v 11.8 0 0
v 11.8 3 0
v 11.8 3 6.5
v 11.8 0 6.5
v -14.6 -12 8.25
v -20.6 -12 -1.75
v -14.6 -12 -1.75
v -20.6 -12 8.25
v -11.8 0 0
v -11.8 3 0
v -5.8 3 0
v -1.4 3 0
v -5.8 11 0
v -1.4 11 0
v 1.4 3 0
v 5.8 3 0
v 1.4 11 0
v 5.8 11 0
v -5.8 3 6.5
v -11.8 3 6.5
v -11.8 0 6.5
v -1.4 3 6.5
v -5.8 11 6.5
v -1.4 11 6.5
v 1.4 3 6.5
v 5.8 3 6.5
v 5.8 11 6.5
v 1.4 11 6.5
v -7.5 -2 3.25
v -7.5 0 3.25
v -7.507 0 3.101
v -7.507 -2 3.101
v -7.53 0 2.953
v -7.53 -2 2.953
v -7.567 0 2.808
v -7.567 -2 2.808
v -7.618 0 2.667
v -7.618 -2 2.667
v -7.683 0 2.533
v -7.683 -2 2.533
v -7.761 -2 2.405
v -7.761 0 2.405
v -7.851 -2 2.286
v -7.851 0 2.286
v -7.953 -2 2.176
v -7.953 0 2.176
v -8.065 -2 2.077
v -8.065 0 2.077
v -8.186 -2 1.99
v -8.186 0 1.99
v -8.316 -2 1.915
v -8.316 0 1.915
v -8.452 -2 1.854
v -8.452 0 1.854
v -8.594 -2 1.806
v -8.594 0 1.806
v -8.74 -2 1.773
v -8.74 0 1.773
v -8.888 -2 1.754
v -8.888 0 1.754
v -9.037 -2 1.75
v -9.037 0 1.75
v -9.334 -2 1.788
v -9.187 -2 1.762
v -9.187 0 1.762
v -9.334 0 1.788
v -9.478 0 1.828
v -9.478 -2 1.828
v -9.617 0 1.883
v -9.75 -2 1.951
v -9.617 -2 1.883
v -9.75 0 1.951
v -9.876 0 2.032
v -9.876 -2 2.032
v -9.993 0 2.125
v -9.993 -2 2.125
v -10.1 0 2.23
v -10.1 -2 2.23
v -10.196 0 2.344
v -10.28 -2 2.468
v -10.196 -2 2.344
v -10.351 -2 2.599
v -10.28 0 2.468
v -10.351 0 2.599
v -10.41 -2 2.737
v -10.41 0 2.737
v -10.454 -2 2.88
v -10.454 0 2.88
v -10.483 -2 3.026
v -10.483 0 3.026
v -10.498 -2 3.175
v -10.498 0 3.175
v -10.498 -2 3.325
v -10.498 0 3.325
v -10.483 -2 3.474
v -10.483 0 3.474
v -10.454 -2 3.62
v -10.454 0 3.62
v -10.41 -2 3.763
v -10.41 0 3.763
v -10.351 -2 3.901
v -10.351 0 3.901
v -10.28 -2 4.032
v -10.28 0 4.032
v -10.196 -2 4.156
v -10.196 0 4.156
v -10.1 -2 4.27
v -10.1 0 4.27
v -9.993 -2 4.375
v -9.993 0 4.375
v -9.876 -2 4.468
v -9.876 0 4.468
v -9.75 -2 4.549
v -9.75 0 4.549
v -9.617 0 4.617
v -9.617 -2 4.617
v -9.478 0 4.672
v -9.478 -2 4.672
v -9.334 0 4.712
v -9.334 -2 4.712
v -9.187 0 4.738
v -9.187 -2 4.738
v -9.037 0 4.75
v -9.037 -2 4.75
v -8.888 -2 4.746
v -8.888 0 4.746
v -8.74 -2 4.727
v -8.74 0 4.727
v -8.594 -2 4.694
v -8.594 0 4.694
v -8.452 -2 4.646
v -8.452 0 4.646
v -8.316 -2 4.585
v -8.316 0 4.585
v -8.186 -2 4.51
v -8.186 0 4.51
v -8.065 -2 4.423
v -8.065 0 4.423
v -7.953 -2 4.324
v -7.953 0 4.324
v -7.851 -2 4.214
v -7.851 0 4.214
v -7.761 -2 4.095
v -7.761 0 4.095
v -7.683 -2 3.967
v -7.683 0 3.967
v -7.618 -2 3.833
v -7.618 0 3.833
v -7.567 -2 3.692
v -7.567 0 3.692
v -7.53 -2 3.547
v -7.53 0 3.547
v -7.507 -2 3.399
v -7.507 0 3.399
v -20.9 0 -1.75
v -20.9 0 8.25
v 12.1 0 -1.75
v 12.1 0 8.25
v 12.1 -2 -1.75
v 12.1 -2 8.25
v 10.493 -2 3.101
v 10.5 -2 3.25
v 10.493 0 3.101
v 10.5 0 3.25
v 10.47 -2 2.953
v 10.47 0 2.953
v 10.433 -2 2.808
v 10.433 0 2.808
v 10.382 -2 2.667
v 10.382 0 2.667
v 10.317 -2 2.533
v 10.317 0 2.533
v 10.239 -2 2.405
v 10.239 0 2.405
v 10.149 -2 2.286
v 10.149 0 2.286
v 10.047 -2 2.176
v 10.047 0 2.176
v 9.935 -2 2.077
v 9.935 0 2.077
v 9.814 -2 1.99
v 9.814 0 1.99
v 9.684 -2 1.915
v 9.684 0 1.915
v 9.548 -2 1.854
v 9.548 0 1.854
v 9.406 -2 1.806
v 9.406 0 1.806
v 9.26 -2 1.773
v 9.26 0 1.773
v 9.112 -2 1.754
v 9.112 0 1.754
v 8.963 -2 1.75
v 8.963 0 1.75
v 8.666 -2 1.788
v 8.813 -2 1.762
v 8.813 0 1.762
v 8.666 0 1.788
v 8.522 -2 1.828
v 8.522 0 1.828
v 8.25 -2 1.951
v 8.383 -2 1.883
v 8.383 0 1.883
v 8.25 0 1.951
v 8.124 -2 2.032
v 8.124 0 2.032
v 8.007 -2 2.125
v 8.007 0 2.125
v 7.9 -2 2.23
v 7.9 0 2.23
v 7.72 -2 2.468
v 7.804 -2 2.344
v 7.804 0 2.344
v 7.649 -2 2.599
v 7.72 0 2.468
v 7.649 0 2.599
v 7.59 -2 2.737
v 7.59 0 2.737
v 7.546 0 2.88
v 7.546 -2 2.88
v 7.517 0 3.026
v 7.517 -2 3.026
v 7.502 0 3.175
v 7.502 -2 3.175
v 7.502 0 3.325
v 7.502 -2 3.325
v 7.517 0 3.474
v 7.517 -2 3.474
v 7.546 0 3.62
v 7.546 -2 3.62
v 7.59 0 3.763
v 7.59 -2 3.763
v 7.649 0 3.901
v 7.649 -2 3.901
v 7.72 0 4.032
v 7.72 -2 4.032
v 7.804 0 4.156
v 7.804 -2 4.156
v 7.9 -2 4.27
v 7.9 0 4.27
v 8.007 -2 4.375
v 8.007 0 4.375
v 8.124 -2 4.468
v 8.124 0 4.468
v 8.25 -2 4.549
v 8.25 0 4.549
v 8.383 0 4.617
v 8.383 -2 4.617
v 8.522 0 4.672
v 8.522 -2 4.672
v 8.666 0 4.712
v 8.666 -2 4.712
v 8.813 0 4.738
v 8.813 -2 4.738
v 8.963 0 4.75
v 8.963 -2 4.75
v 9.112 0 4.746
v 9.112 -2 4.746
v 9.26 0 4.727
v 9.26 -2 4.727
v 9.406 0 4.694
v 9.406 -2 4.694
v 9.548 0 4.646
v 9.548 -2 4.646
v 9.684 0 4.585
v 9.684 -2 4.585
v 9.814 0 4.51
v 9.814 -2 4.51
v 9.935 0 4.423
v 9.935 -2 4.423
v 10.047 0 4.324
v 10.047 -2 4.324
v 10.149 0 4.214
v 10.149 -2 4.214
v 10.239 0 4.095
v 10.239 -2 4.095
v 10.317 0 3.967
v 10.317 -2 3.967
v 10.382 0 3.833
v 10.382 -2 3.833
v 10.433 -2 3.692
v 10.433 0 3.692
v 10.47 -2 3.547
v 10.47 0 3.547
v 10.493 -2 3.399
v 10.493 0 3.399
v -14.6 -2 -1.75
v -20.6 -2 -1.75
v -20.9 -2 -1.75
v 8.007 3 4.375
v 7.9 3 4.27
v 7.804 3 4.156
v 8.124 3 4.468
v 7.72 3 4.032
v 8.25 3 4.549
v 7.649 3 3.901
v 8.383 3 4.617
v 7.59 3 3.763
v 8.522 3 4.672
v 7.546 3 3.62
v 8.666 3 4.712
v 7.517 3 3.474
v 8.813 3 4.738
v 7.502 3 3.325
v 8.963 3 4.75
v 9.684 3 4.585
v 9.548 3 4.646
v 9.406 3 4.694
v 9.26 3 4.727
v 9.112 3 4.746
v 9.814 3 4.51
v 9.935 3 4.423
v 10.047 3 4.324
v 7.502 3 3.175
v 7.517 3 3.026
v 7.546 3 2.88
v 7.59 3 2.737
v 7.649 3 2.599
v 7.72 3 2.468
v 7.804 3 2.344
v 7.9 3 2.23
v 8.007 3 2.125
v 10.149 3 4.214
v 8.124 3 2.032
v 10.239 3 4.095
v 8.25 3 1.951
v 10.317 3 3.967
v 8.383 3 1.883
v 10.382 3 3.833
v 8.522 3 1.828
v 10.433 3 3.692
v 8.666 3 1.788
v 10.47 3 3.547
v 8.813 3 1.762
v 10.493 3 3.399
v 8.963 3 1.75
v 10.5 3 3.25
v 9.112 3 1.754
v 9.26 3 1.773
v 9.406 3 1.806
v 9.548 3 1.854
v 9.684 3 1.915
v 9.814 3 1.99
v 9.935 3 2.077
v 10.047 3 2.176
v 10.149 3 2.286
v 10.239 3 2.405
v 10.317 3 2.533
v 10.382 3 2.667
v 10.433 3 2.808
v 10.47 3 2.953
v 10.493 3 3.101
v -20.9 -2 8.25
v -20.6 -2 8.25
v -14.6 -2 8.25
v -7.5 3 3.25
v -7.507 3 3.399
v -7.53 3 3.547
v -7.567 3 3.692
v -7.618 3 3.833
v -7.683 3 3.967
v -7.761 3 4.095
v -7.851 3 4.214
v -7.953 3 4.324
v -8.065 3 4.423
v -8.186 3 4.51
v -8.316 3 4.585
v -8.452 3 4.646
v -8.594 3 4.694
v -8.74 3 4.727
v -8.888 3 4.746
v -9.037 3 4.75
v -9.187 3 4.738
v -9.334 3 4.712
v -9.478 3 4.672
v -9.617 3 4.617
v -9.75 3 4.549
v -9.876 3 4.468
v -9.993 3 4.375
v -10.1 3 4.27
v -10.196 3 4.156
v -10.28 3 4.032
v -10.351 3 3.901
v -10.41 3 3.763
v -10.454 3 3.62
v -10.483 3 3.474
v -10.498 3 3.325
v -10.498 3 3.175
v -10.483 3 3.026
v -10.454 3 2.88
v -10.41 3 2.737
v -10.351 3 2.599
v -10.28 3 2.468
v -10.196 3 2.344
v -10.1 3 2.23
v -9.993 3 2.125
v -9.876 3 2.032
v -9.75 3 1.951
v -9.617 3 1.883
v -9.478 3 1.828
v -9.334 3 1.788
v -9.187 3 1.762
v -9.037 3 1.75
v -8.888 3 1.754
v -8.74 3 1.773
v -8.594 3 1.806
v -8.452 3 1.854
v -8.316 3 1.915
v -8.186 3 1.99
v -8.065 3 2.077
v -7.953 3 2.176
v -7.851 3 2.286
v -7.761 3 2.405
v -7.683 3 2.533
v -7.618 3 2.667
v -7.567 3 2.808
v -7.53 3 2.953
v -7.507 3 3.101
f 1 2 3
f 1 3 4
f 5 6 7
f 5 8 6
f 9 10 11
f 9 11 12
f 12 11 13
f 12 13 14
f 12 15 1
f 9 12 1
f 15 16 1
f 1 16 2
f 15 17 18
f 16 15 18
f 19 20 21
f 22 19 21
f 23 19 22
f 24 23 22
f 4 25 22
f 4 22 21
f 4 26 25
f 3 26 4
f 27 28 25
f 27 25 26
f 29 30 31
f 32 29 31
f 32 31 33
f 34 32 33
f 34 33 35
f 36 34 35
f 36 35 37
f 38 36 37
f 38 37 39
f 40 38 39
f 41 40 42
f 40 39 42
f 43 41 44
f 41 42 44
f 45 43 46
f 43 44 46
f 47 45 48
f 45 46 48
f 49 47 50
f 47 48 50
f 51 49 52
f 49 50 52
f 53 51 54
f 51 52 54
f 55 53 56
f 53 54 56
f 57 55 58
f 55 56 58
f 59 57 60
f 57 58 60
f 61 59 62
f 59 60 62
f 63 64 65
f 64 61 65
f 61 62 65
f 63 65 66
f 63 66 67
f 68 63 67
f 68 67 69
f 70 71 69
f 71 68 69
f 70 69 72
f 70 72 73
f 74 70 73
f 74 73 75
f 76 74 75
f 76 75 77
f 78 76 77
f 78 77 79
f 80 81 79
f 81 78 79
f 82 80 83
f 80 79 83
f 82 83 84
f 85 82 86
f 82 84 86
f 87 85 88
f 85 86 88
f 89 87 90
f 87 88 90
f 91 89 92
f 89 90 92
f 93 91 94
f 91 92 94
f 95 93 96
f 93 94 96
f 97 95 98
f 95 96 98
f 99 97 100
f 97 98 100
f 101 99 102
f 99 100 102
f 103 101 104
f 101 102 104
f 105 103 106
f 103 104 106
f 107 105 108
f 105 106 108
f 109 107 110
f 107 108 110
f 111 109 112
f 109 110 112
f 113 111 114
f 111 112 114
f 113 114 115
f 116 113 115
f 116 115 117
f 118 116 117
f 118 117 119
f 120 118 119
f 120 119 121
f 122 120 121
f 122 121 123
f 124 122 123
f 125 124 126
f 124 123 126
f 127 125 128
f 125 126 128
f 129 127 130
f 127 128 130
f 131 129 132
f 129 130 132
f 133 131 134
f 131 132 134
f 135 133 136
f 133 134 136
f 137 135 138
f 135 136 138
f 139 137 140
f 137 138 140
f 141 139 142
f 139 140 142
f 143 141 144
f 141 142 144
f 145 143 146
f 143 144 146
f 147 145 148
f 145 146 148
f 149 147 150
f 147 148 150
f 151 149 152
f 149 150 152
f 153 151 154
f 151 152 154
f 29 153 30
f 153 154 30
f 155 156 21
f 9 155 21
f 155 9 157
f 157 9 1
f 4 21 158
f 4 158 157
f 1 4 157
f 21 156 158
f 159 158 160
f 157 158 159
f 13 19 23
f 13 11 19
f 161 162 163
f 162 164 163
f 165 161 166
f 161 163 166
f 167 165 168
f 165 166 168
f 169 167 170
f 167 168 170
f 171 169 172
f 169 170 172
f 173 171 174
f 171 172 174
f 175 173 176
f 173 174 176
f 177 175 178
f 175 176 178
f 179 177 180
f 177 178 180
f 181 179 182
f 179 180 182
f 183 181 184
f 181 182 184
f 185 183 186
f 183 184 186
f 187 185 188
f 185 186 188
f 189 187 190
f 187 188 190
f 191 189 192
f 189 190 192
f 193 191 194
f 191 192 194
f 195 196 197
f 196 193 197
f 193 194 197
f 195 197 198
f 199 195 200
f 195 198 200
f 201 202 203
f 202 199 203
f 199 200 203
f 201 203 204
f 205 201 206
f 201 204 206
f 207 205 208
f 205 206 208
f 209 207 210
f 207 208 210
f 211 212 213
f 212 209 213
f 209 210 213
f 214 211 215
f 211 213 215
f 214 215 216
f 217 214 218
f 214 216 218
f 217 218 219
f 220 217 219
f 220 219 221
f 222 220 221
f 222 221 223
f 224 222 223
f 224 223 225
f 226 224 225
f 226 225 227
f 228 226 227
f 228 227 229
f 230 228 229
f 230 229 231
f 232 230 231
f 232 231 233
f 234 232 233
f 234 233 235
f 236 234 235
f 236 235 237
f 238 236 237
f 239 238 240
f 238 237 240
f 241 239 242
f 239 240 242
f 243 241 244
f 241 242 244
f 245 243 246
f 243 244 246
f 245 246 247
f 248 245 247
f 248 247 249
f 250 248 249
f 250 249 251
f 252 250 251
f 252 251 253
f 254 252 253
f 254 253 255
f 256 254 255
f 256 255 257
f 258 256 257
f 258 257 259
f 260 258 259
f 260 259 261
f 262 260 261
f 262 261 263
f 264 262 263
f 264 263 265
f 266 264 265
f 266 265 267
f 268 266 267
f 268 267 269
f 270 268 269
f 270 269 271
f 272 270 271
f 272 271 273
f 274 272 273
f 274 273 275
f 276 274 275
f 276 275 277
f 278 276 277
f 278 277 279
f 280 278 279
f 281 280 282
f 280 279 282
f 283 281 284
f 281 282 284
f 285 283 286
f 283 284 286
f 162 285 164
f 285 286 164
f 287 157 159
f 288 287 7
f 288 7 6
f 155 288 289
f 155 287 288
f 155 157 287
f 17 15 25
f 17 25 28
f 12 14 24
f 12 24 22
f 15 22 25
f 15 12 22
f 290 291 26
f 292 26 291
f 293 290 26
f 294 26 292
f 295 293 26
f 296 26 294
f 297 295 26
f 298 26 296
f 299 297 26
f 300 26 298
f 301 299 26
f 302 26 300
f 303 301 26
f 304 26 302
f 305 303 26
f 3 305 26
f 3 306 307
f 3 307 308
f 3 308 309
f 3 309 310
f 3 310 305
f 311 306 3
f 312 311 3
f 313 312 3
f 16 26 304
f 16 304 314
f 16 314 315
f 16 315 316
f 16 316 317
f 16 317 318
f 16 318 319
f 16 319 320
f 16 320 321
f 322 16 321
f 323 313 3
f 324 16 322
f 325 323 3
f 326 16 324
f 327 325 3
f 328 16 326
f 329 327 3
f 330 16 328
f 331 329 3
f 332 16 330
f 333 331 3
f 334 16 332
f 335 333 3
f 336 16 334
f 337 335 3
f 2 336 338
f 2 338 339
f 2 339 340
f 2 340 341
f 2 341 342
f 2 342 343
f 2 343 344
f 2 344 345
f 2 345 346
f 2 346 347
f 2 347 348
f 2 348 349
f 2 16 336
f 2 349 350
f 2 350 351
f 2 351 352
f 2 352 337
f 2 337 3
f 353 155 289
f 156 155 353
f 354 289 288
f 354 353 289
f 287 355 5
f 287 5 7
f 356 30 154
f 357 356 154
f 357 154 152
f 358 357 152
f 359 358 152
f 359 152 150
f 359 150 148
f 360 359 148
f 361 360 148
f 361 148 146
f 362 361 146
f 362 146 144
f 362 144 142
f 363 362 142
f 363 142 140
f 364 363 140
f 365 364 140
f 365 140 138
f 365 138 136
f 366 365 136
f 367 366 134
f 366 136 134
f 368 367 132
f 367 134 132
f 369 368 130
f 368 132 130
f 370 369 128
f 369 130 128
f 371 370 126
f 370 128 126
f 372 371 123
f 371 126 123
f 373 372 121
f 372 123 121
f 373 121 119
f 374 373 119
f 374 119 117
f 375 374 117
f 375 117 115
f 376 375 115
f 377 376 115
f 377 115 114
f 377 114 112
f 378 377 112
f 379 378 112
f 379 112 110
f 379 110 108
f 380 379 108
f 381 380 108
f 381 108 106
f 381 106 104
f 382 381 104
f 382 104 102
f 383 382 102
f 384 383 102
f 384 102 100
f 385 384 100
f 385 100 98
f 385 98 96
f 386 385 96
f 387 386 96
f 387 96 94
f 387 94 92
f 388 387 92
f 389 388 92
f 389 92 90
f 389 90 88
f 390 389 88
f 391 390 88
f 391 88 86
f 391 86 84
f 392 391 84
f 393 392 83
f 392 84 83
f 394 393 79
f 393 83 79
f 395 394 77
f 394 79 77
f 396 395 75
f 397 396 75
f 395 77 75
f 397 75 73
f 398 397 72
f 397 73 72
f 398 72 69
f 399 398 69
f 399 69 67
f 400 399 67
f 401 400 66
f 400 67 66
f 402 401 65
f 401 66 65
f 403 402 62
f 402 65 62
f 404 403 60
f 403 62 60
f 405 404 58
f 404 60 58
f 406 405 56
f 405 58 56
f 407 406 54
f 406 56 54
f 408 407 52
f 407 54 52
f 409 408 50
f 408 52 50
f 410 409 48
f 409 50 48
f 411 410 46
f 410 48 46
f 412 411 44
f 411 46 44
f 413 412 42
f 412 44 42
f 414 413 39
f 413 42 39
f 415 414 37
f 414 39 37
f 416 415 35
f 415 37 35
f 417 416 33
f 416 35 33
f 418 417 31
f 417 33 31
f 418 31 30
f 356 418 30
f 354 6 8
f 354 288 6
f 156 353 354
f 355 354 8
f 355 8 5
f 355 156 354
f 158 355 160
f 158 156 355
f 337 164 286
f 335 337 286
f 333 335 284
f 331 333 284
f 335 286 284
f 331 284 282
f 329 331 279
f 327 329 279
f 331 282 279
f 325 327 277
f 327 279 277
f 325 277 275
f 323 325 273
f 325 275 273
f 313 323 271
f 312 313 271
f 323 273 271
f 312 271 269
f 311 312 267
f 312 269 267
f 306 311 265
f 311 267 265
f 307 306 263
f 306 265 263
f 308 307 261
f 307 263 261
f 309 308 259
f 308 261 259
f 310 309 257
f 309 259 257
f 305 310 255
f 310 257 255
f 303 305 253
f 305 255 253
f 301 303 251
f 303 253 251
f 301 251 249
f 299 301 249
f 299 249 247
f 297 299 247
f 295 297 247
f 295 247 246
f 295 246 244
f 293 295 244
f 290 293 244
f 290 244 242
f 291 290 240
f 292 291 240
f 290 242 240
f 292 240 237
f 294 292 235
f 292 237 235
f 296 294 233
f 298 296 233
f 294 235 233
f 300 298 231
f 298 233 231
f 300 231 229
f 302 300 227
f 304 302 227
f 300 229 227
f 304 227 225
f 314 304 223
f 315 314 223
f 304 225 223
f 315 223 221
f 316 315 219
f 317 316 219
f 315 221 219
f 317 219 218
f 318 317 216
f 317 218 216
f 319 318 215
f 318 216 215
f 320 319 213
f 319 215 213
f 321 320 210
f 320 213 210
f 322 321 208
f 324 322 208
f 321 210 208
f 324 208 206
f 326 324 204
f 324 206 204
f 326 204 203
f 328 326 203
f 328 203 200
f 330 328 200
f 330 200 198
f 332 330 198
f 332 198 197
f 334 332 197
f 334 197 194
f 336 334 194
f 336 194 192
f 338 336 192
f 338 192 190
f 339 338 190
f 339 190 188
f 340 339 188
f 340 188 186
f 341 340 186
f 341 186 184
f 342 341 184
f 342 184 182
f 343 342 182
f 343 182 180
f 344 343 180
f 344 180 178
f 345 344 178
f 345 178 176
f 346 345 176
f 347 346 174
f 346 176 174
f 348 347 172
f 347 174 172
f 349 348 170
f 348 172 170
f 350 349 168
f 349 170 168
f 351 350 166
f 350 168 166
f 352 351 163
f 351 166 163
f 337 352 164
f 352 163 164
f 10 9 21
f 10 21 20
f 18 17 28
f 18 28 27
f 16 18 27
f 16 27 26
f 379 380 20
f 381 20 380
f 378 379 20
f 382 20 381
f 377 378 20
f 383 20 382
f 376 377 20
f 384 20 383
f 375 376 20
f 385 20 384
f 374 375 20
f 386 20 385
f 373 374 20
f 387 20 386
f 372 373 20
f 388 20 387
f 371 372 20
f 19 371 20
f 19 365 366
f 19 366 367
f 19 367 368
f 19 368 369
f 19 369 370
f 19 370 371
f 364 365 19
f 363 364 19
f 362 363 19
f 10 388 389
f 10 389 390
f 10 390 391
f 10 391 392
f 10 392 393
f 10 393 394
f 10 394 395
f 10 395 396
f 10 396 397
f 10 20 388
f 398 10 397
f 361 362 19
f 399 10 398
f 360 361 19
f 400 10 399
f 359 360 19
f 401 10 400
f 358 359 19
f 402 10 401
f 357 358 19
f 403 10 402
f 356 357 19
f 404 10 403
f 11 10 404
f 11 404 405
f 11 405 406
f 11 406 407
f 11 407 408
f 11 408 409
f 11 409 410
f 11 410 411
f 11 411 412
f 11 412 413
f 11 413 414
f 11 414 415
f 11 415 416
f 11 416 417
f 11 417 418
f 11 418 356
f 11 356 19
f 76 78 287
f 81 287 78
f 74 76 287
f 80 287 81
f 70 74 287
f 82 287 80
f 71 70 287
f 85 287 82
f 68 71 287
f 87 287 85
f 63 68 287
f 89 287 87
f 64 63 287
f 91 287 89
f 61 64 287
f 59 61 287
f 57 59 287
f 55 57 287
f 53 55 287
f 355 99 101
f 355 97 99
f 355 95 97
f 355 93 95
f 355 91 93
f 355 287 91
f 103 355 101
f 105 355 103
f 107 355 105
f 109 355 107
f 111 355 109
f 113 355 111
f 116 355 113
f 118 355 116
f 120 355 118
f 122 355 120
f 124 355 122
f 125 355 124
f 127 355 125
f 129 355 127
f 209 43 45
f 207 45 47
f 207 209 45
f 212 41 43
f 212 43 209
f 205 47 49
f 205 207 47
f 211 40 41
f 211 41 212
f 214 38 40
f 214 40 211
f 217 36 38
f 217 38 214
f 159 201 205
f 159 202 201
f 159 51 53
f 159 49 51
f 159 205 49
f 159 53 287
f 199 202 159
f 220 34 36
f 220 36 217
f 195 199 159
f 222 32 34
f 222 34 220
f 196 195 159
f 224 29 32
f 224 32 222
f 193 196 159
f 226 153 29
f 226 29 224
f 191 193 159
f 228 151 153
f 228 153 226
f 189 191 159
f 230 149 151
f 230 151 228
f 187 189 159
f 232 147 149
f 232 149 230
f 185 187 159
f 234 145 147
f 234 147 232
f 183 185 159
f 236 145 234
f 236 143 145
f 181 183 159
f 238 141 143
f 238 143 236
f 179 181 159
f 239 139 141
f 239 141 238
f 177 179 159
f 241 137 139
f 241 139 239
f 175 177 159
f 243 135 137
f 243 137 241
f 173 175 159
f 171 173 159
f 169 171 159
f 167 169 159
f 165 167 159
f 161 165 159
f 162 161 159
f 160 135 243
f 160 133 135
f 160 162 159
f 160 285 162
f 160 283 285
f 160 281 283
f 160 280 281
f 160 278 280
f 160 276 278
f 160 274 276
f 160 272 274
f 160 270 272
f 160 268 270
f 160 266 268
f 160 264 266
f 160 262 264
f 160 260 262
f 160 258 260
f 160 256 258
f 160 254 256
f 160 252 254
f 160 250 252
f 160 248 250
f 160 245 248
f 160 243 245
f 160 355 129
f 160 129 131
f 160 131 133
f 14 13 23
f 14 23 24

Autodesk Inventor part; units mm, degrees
ref_plane "YZ Plane" through (0, 0, 0) normal (1, 0, 0) x (0, 1, 0)
ref_plane "XZ Plane" through (0, 0, 0) normal (0, 1, 0) x (-1, 0, 0)
ref_plane "XY Plane" through (0, 0, 0) normal (0, 0, 1) x (1, 0, 0)
sketch "Sketch1" plane through (0, 0, 0) normal (0, 0, 1) x (1, 0, 0)
  line L0 (-11.8, 0) -> (-11.8, 3)
  line L1 (-11.8, 3) -> (-5.8, 3)
  line L2 (-5.8, 3) -> (-5.8, 11)
  line L3 (-5.8, 11) -> (-1.4, 11)
  line L4 (-1.4, 11) -> (-1.4, 3)
  line L5 (-1.4, 3) -> (1.4, 3)
  line L6 (1.4, 3) -> (1.4, 11)
  line L7 (1.4, 11) -> (5.8, 11)
  line L8 (5.8, 11) -> (5.8, 3)
  line L9 (5.8, 3) -> (11.8, 3)
  line L10 (11.8, 3) -> (11.8, 0)
  line L11 (11.8, 0) -> (-11.8, 0)
  point P0 (0, 0)
  dimension "d0" = 3
  dimension "d1" = 6
  dimension "d2" = 8
  dimension "d3" = 4.4
  dimension "d4" = 2.8
  dimension "d5" = 4.4
  dimension "d6" = 6
  dimension "d7" = 1.4
  dimension "d8" = 0
extrude "Extrusion1" add sketch "Sketch1" along normal blind 6.5
sketch "Sketch2" plane through (-11.8, 0, 0) normal (0, -1, 0) x (1, 0, 0)
  circle A0 centre (2.8, 3.25) radius 1.5
  circle A1 centre (20.8, 3.25) radius 1.5
  line L0 (23.6, 0) -> (23.6, 6.5) projected
  line L1 (0, 0) -> (0, 6.5) projected
  line L2 (23.6, 0) -> (0, 0) projected
  line L3 (0, 6.5) -> (23.6, 6.5) projected
  line L4 (11.8, 17.7341) -> (11.8, -9.1991) construction
  line L5 (10.4, 0) -> (10.4, 6.5) construction
  line L6 (13.2, 0) -> (13.2, 6.5) construction
  point P0 (11.8, 0)
  dimension "d11" = 3
  dimension "d12" = 3
  dimension "d13" = 18
  dimension "d14" = 23.6
  dimension "d15" = 2.8
  dimension "d16" = 6.5
  dimension "d17" = 3.25
  dimension "d18" = 3.25
  dimension "d34" = 2.8
  dimension "d35" = 1.4
extrude "Extrusion2" cut sketch "Sketch2" against normal through all contours A0 | A1
sketch "Sketch3" plane through (-11.8, 0, 0) normal (0, -1, 0) x (1, 0, 0)
  line L0 (-9.1, 8.25) -> (23.9, 8.25)
  line L1 (23.9, 8.25) -> (23.9, -1.75)
  line L2 (23.9, -1.75) -> (-9.1, -1.75)
  line L3 (-9.1, -1.75) -> (-9.1, 8.25)
  line L4 (23.6, 0) -> (23.6, 6.5) projected
  line L5 (23.6, 0) -> (0, 0) projected
  line L6 (0, 6.5) -> (23.6, 6.5) projected
  circle A0 centre (2.8, 3.25) radius 1.5 projected
  circle A1 centre (20.8, 3.25) radius 1.5 projected
  point P0 (11.8, 0)
  dimension "d21" = 10
  dimension "d22" = 33
  dimension "d23" = 0.3
  dimension "d24" = 6.5
  dimension "d25" = 1.75
extrude "Extrusion3" add sketch "Sketch3" along normal blind 2
sketch "Sketch4" plane through (-11.8, -2, 0) normal (0, -1, 0) x (1, 0, 0)
  line L0 (-8.8, 8.25) -> (-2.8, 8.25)
  line L1 (-2.8, 8.25) -> (-2.8, -1.75)
  line L2 (-2.8, -1.75) -> (-8.8, -1.75)
  line L3 (-8.8, -1.75) -> (-8.8, 8.25)
  line L4 (-9.1, -1.75) -> (23.9, -1.75) projected
  line L5 (-9.1, -1.75) -> (-9.1, 8.25) projected
  point P0 (11.8, 0)
  dimension "d28" = 10
  dimension "d29" = 6
  dimension "d30" = 0
  dimension "d31" = 0.3
extrude "Extrusion4" add sketch "Sketch4" along normal blind 10
equation "\"d7\" = 0.5 * d4"
equation "\"d15\" = -0.5 * d13 + 0.5 * d14"
equation "\"d17\" = 0.5 * d16"
equation "\"d18\" = d17"
equation "\"d25\" = -0.5 * d24 + 0.5 * d21"
properties part number "optical endstop"
